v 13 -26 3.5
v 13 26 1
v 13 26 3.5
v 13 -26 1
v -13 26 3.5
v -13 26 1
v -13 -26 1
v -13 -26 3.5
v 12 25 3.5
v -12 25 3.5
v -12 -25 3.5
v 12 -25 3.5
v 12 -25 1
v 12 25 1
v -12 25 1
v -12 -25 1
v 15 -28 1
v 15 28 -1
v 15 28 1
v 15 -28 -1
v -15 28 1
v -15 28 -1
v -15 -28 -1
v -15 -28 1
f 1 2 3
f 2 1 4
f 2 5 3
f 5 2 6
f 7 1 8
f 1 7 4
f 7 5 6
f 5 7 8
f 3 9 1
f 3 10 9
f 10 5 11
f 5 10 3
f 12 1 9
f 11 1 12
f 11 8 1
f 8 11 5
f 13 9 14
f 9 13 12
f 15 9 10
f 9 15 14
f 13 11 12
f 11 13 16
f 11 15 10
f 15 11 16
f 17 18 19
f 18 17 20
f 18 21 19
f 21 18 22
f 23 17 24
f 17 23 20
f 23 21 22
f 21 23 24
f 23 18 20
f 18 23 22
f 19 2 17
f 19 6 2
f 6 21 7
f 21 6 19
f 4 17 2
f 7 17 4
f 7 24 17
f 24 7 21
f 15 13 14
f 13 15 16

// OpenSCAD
module core(deg){
color("red")
rotate([0,0,deg])
translate([0,0,160/2+2]) 
cube(size = [11,1.8,160], center = true);
}

module portacub(){
	translate([0,0,48/2])
	difference(){
		cube(size = [30,18,56], center = true);
		translate([0,-2,0])cube(size = [26,18,52], center = true);
		cylinder(h = 150, r=4);
	}
}


module tapa(){

	cube(size = [30,2,56], center = true);
	difference(){
		translate([0,-2,0])cube(size = [26,3,52], center = true);
		cube(size = [24,18,50], center = true);

	}
}

module cil_vairlla(){
difference(){
 	union(){
		translate([0,0,47.8])cylinder(h = 150-48, r=7);
		porta9V();
	}
	for ( dg = [0 : 360/8 : 360] )
	{
 		core(dg);
	}
	color("green")translate([0,0,3])cylinder(h = 150, r=3);

}
}


module varilla(){
difference(){
 	union(){
		cylinder(h = 130, r=7);

	}
	translate([0,0,-3])for ( dg = [0 : 360/8 : 360] )
	{
 		core(dg);
	}
	color("green")translate([0,0,-3])cylinder(h = 150, r=3);

}
}

//cil_vairlla();
//varilla();
module porta9V(){
	portacub();
	color("red")difference(){
		translate([0,0,57.5])cube(size = [18,18,12], center = true);
		cylinder(h = 130, r=7);
	}
}
//rotate([-90,0,0])porta9V();
rotate([-90,0,0])tapa();
